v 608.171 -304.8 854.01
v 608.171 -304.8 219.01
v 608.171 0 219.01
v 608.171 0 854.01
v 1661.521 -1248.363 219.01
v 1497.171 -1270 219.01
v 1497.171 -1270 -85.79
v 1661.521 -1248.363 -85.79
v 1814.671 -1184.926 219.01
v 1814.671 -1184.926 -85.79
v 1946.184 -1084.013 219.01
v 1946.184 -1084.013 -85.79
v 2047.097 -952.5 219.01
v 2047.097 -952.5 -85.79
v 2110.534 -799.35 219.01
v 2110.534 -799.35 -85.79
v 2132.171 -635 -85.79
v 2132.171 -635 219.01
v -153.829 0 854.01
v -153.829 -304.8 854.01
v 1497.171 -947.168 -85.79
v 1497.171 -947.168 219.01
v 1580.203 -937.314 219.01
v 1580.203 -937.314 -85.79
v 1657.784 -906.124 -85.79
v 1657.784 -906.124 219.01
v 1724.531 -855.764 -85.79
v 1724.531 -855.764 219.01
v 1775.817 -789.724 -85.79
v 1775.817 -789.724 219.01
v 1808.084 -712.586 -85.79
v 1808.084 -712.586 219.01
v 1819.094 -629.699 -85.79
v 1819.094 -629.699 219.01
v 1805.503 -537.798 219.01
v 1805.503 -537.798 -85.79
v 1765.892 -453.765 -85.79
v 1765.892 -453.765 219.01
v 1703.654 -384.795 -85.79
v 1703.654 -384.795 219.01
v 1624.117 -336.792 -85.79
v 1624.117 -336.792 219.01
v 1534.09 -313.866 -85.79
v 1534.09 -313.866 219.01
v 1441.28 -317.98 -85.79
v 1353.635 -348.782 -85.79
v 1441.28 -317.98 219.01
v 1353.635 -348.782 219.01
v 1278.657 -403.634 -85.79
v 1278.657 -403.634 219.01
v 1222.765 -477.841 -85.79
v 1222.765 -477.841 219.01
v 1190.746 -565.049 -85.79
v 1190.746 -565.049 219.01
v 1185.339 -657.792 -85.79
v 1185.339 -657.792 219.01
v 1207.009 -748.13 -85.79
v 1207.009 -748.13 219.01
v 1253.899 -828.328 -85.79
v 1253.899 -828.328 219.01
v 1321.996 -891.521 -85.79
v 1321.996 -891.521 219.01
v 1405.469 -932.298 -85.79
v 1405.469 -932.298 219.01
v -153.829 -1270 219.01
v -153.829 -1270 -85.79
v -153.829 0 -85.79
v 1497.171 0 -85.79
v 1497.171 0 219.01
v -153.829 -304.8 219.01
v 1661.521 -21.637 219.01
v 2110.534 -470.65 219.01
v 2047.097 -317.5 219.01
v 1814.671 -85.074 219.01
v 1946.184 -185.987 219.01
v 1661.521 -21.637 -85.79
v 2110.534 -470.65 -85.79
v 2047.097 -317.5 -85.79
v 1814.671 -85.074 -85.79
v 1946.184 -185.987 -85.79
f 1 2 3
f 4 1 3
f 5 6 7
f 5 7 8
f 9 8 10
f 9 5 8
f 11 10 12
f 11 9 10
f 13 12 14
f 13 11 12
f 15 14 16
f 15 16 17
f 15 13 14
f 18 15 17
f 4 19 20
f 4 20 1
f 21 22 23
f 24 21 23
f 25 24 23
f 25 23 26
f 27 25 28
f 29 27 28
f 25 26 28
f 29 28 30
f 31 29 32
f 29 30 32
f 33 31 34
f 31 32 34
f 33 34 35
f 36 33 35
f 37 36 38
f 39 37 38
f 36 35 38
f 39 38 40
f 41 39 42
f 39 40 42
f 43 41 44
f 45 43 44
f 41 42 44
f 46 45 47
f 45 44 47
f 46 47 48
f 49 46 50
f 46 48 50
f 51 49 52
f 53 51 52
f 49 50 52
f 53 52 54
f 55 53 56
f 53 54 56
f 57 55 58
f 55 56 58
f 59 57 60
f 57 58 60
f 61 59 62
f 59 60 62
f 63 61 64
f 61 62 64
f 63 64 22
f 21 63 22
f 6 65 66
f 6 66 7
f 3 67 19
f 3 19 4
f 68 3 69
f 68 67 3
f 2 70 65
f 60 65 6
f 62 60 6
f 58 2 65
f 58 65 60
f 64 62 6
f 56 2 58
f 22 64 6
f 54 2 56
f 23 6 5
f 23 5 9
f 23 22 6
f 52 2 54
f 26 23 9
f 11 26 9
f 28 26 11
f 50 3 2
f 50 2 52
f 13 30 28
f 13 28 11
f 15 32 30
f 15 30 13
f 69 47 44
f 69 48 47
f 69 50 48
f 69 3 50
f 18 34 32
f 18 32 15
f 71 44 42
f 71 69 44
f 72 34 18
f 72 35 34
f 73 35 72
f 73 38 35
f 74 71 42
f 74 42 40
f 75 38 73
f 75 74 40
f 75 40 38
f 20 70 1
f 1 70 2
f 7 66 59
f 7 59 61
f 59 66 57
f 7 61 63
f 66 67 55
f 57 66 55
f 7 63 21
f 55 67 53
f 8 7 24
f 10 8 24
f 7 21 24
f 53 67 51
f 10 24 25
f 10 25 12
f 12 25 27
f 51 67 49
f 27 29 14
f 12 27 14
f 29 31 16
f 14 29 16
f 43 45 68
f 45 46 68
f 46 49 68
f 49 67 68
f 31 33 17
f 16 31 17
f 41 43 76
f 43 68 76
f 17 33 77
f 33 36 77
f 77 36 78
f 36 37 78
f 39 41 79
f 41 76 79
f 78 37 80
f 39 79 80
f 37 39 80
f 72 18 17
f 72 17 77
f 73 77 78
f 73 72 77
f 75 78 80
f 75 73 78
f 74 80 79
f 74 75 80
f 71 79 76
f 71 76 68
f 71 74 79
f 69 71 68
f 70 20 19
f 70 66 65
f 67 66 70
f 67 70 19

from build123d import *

# Parameters (mm, degrees)
F0_W     = 1651
F0_H     = 304.8
F1_DEPTH = 1270
F2_W     = 762
F2_H     = 304.8
F3_DEPTH = 635
F5_DEPTH = 304.8
F8_DEPTH = 576.58


with BuildPart() as f1:
    # F0 (on Front) → F1 (new body)
    with BuildSketch(Plane.XZ):
        with Locations((671.6712, 66.609716)):
            Rectangle(F0_W, F0_H)
    extrude(amount=F1_DEPTH)

    # F2 (on face) → F3 (join)
    with BuildSketch(Plane.XY.offset(219.009716)):
        with Locations((227.1712, -152.4)):
            Rectangle(F2_W, F2_H)
    extrude(amount=F3_DEPTH)

    # F4 (on face) → F5 (join)
    with BuildSketch(Plane.XY.offset(219.009716)):
        with BuildLine():
            ThreePointArc((1497.1712, -1270), (1946.184006, -1084.012806), (2132.1712, -635))
            ThreePointArc((2132.1712, -635), (1946.184006, -185.987194), (1497.1712, 0))
            Line((1497.1712, 0), (1497.1712, -1270))
        make_face()
    extrude(amount=-F5_DEPTH)

    # F7 (on face) → F8 (cut)
    with BuildSketch(Plane.XY.offset(219.009716)):
        with BuildLine():
            ThreePointArc((1497.1712, -947.168186), (1724.531189, -855.763664), (1819.093947, -629.698992))
            ThreePointArc((1819.093947, -629.698992), (1278.656705, -403.634319), (1497.1712, -947.168186))
        make_face()
    extrude(amount=-F8_DEPTH, mode=Mode.SUBTRACT)


solid = f1.part
